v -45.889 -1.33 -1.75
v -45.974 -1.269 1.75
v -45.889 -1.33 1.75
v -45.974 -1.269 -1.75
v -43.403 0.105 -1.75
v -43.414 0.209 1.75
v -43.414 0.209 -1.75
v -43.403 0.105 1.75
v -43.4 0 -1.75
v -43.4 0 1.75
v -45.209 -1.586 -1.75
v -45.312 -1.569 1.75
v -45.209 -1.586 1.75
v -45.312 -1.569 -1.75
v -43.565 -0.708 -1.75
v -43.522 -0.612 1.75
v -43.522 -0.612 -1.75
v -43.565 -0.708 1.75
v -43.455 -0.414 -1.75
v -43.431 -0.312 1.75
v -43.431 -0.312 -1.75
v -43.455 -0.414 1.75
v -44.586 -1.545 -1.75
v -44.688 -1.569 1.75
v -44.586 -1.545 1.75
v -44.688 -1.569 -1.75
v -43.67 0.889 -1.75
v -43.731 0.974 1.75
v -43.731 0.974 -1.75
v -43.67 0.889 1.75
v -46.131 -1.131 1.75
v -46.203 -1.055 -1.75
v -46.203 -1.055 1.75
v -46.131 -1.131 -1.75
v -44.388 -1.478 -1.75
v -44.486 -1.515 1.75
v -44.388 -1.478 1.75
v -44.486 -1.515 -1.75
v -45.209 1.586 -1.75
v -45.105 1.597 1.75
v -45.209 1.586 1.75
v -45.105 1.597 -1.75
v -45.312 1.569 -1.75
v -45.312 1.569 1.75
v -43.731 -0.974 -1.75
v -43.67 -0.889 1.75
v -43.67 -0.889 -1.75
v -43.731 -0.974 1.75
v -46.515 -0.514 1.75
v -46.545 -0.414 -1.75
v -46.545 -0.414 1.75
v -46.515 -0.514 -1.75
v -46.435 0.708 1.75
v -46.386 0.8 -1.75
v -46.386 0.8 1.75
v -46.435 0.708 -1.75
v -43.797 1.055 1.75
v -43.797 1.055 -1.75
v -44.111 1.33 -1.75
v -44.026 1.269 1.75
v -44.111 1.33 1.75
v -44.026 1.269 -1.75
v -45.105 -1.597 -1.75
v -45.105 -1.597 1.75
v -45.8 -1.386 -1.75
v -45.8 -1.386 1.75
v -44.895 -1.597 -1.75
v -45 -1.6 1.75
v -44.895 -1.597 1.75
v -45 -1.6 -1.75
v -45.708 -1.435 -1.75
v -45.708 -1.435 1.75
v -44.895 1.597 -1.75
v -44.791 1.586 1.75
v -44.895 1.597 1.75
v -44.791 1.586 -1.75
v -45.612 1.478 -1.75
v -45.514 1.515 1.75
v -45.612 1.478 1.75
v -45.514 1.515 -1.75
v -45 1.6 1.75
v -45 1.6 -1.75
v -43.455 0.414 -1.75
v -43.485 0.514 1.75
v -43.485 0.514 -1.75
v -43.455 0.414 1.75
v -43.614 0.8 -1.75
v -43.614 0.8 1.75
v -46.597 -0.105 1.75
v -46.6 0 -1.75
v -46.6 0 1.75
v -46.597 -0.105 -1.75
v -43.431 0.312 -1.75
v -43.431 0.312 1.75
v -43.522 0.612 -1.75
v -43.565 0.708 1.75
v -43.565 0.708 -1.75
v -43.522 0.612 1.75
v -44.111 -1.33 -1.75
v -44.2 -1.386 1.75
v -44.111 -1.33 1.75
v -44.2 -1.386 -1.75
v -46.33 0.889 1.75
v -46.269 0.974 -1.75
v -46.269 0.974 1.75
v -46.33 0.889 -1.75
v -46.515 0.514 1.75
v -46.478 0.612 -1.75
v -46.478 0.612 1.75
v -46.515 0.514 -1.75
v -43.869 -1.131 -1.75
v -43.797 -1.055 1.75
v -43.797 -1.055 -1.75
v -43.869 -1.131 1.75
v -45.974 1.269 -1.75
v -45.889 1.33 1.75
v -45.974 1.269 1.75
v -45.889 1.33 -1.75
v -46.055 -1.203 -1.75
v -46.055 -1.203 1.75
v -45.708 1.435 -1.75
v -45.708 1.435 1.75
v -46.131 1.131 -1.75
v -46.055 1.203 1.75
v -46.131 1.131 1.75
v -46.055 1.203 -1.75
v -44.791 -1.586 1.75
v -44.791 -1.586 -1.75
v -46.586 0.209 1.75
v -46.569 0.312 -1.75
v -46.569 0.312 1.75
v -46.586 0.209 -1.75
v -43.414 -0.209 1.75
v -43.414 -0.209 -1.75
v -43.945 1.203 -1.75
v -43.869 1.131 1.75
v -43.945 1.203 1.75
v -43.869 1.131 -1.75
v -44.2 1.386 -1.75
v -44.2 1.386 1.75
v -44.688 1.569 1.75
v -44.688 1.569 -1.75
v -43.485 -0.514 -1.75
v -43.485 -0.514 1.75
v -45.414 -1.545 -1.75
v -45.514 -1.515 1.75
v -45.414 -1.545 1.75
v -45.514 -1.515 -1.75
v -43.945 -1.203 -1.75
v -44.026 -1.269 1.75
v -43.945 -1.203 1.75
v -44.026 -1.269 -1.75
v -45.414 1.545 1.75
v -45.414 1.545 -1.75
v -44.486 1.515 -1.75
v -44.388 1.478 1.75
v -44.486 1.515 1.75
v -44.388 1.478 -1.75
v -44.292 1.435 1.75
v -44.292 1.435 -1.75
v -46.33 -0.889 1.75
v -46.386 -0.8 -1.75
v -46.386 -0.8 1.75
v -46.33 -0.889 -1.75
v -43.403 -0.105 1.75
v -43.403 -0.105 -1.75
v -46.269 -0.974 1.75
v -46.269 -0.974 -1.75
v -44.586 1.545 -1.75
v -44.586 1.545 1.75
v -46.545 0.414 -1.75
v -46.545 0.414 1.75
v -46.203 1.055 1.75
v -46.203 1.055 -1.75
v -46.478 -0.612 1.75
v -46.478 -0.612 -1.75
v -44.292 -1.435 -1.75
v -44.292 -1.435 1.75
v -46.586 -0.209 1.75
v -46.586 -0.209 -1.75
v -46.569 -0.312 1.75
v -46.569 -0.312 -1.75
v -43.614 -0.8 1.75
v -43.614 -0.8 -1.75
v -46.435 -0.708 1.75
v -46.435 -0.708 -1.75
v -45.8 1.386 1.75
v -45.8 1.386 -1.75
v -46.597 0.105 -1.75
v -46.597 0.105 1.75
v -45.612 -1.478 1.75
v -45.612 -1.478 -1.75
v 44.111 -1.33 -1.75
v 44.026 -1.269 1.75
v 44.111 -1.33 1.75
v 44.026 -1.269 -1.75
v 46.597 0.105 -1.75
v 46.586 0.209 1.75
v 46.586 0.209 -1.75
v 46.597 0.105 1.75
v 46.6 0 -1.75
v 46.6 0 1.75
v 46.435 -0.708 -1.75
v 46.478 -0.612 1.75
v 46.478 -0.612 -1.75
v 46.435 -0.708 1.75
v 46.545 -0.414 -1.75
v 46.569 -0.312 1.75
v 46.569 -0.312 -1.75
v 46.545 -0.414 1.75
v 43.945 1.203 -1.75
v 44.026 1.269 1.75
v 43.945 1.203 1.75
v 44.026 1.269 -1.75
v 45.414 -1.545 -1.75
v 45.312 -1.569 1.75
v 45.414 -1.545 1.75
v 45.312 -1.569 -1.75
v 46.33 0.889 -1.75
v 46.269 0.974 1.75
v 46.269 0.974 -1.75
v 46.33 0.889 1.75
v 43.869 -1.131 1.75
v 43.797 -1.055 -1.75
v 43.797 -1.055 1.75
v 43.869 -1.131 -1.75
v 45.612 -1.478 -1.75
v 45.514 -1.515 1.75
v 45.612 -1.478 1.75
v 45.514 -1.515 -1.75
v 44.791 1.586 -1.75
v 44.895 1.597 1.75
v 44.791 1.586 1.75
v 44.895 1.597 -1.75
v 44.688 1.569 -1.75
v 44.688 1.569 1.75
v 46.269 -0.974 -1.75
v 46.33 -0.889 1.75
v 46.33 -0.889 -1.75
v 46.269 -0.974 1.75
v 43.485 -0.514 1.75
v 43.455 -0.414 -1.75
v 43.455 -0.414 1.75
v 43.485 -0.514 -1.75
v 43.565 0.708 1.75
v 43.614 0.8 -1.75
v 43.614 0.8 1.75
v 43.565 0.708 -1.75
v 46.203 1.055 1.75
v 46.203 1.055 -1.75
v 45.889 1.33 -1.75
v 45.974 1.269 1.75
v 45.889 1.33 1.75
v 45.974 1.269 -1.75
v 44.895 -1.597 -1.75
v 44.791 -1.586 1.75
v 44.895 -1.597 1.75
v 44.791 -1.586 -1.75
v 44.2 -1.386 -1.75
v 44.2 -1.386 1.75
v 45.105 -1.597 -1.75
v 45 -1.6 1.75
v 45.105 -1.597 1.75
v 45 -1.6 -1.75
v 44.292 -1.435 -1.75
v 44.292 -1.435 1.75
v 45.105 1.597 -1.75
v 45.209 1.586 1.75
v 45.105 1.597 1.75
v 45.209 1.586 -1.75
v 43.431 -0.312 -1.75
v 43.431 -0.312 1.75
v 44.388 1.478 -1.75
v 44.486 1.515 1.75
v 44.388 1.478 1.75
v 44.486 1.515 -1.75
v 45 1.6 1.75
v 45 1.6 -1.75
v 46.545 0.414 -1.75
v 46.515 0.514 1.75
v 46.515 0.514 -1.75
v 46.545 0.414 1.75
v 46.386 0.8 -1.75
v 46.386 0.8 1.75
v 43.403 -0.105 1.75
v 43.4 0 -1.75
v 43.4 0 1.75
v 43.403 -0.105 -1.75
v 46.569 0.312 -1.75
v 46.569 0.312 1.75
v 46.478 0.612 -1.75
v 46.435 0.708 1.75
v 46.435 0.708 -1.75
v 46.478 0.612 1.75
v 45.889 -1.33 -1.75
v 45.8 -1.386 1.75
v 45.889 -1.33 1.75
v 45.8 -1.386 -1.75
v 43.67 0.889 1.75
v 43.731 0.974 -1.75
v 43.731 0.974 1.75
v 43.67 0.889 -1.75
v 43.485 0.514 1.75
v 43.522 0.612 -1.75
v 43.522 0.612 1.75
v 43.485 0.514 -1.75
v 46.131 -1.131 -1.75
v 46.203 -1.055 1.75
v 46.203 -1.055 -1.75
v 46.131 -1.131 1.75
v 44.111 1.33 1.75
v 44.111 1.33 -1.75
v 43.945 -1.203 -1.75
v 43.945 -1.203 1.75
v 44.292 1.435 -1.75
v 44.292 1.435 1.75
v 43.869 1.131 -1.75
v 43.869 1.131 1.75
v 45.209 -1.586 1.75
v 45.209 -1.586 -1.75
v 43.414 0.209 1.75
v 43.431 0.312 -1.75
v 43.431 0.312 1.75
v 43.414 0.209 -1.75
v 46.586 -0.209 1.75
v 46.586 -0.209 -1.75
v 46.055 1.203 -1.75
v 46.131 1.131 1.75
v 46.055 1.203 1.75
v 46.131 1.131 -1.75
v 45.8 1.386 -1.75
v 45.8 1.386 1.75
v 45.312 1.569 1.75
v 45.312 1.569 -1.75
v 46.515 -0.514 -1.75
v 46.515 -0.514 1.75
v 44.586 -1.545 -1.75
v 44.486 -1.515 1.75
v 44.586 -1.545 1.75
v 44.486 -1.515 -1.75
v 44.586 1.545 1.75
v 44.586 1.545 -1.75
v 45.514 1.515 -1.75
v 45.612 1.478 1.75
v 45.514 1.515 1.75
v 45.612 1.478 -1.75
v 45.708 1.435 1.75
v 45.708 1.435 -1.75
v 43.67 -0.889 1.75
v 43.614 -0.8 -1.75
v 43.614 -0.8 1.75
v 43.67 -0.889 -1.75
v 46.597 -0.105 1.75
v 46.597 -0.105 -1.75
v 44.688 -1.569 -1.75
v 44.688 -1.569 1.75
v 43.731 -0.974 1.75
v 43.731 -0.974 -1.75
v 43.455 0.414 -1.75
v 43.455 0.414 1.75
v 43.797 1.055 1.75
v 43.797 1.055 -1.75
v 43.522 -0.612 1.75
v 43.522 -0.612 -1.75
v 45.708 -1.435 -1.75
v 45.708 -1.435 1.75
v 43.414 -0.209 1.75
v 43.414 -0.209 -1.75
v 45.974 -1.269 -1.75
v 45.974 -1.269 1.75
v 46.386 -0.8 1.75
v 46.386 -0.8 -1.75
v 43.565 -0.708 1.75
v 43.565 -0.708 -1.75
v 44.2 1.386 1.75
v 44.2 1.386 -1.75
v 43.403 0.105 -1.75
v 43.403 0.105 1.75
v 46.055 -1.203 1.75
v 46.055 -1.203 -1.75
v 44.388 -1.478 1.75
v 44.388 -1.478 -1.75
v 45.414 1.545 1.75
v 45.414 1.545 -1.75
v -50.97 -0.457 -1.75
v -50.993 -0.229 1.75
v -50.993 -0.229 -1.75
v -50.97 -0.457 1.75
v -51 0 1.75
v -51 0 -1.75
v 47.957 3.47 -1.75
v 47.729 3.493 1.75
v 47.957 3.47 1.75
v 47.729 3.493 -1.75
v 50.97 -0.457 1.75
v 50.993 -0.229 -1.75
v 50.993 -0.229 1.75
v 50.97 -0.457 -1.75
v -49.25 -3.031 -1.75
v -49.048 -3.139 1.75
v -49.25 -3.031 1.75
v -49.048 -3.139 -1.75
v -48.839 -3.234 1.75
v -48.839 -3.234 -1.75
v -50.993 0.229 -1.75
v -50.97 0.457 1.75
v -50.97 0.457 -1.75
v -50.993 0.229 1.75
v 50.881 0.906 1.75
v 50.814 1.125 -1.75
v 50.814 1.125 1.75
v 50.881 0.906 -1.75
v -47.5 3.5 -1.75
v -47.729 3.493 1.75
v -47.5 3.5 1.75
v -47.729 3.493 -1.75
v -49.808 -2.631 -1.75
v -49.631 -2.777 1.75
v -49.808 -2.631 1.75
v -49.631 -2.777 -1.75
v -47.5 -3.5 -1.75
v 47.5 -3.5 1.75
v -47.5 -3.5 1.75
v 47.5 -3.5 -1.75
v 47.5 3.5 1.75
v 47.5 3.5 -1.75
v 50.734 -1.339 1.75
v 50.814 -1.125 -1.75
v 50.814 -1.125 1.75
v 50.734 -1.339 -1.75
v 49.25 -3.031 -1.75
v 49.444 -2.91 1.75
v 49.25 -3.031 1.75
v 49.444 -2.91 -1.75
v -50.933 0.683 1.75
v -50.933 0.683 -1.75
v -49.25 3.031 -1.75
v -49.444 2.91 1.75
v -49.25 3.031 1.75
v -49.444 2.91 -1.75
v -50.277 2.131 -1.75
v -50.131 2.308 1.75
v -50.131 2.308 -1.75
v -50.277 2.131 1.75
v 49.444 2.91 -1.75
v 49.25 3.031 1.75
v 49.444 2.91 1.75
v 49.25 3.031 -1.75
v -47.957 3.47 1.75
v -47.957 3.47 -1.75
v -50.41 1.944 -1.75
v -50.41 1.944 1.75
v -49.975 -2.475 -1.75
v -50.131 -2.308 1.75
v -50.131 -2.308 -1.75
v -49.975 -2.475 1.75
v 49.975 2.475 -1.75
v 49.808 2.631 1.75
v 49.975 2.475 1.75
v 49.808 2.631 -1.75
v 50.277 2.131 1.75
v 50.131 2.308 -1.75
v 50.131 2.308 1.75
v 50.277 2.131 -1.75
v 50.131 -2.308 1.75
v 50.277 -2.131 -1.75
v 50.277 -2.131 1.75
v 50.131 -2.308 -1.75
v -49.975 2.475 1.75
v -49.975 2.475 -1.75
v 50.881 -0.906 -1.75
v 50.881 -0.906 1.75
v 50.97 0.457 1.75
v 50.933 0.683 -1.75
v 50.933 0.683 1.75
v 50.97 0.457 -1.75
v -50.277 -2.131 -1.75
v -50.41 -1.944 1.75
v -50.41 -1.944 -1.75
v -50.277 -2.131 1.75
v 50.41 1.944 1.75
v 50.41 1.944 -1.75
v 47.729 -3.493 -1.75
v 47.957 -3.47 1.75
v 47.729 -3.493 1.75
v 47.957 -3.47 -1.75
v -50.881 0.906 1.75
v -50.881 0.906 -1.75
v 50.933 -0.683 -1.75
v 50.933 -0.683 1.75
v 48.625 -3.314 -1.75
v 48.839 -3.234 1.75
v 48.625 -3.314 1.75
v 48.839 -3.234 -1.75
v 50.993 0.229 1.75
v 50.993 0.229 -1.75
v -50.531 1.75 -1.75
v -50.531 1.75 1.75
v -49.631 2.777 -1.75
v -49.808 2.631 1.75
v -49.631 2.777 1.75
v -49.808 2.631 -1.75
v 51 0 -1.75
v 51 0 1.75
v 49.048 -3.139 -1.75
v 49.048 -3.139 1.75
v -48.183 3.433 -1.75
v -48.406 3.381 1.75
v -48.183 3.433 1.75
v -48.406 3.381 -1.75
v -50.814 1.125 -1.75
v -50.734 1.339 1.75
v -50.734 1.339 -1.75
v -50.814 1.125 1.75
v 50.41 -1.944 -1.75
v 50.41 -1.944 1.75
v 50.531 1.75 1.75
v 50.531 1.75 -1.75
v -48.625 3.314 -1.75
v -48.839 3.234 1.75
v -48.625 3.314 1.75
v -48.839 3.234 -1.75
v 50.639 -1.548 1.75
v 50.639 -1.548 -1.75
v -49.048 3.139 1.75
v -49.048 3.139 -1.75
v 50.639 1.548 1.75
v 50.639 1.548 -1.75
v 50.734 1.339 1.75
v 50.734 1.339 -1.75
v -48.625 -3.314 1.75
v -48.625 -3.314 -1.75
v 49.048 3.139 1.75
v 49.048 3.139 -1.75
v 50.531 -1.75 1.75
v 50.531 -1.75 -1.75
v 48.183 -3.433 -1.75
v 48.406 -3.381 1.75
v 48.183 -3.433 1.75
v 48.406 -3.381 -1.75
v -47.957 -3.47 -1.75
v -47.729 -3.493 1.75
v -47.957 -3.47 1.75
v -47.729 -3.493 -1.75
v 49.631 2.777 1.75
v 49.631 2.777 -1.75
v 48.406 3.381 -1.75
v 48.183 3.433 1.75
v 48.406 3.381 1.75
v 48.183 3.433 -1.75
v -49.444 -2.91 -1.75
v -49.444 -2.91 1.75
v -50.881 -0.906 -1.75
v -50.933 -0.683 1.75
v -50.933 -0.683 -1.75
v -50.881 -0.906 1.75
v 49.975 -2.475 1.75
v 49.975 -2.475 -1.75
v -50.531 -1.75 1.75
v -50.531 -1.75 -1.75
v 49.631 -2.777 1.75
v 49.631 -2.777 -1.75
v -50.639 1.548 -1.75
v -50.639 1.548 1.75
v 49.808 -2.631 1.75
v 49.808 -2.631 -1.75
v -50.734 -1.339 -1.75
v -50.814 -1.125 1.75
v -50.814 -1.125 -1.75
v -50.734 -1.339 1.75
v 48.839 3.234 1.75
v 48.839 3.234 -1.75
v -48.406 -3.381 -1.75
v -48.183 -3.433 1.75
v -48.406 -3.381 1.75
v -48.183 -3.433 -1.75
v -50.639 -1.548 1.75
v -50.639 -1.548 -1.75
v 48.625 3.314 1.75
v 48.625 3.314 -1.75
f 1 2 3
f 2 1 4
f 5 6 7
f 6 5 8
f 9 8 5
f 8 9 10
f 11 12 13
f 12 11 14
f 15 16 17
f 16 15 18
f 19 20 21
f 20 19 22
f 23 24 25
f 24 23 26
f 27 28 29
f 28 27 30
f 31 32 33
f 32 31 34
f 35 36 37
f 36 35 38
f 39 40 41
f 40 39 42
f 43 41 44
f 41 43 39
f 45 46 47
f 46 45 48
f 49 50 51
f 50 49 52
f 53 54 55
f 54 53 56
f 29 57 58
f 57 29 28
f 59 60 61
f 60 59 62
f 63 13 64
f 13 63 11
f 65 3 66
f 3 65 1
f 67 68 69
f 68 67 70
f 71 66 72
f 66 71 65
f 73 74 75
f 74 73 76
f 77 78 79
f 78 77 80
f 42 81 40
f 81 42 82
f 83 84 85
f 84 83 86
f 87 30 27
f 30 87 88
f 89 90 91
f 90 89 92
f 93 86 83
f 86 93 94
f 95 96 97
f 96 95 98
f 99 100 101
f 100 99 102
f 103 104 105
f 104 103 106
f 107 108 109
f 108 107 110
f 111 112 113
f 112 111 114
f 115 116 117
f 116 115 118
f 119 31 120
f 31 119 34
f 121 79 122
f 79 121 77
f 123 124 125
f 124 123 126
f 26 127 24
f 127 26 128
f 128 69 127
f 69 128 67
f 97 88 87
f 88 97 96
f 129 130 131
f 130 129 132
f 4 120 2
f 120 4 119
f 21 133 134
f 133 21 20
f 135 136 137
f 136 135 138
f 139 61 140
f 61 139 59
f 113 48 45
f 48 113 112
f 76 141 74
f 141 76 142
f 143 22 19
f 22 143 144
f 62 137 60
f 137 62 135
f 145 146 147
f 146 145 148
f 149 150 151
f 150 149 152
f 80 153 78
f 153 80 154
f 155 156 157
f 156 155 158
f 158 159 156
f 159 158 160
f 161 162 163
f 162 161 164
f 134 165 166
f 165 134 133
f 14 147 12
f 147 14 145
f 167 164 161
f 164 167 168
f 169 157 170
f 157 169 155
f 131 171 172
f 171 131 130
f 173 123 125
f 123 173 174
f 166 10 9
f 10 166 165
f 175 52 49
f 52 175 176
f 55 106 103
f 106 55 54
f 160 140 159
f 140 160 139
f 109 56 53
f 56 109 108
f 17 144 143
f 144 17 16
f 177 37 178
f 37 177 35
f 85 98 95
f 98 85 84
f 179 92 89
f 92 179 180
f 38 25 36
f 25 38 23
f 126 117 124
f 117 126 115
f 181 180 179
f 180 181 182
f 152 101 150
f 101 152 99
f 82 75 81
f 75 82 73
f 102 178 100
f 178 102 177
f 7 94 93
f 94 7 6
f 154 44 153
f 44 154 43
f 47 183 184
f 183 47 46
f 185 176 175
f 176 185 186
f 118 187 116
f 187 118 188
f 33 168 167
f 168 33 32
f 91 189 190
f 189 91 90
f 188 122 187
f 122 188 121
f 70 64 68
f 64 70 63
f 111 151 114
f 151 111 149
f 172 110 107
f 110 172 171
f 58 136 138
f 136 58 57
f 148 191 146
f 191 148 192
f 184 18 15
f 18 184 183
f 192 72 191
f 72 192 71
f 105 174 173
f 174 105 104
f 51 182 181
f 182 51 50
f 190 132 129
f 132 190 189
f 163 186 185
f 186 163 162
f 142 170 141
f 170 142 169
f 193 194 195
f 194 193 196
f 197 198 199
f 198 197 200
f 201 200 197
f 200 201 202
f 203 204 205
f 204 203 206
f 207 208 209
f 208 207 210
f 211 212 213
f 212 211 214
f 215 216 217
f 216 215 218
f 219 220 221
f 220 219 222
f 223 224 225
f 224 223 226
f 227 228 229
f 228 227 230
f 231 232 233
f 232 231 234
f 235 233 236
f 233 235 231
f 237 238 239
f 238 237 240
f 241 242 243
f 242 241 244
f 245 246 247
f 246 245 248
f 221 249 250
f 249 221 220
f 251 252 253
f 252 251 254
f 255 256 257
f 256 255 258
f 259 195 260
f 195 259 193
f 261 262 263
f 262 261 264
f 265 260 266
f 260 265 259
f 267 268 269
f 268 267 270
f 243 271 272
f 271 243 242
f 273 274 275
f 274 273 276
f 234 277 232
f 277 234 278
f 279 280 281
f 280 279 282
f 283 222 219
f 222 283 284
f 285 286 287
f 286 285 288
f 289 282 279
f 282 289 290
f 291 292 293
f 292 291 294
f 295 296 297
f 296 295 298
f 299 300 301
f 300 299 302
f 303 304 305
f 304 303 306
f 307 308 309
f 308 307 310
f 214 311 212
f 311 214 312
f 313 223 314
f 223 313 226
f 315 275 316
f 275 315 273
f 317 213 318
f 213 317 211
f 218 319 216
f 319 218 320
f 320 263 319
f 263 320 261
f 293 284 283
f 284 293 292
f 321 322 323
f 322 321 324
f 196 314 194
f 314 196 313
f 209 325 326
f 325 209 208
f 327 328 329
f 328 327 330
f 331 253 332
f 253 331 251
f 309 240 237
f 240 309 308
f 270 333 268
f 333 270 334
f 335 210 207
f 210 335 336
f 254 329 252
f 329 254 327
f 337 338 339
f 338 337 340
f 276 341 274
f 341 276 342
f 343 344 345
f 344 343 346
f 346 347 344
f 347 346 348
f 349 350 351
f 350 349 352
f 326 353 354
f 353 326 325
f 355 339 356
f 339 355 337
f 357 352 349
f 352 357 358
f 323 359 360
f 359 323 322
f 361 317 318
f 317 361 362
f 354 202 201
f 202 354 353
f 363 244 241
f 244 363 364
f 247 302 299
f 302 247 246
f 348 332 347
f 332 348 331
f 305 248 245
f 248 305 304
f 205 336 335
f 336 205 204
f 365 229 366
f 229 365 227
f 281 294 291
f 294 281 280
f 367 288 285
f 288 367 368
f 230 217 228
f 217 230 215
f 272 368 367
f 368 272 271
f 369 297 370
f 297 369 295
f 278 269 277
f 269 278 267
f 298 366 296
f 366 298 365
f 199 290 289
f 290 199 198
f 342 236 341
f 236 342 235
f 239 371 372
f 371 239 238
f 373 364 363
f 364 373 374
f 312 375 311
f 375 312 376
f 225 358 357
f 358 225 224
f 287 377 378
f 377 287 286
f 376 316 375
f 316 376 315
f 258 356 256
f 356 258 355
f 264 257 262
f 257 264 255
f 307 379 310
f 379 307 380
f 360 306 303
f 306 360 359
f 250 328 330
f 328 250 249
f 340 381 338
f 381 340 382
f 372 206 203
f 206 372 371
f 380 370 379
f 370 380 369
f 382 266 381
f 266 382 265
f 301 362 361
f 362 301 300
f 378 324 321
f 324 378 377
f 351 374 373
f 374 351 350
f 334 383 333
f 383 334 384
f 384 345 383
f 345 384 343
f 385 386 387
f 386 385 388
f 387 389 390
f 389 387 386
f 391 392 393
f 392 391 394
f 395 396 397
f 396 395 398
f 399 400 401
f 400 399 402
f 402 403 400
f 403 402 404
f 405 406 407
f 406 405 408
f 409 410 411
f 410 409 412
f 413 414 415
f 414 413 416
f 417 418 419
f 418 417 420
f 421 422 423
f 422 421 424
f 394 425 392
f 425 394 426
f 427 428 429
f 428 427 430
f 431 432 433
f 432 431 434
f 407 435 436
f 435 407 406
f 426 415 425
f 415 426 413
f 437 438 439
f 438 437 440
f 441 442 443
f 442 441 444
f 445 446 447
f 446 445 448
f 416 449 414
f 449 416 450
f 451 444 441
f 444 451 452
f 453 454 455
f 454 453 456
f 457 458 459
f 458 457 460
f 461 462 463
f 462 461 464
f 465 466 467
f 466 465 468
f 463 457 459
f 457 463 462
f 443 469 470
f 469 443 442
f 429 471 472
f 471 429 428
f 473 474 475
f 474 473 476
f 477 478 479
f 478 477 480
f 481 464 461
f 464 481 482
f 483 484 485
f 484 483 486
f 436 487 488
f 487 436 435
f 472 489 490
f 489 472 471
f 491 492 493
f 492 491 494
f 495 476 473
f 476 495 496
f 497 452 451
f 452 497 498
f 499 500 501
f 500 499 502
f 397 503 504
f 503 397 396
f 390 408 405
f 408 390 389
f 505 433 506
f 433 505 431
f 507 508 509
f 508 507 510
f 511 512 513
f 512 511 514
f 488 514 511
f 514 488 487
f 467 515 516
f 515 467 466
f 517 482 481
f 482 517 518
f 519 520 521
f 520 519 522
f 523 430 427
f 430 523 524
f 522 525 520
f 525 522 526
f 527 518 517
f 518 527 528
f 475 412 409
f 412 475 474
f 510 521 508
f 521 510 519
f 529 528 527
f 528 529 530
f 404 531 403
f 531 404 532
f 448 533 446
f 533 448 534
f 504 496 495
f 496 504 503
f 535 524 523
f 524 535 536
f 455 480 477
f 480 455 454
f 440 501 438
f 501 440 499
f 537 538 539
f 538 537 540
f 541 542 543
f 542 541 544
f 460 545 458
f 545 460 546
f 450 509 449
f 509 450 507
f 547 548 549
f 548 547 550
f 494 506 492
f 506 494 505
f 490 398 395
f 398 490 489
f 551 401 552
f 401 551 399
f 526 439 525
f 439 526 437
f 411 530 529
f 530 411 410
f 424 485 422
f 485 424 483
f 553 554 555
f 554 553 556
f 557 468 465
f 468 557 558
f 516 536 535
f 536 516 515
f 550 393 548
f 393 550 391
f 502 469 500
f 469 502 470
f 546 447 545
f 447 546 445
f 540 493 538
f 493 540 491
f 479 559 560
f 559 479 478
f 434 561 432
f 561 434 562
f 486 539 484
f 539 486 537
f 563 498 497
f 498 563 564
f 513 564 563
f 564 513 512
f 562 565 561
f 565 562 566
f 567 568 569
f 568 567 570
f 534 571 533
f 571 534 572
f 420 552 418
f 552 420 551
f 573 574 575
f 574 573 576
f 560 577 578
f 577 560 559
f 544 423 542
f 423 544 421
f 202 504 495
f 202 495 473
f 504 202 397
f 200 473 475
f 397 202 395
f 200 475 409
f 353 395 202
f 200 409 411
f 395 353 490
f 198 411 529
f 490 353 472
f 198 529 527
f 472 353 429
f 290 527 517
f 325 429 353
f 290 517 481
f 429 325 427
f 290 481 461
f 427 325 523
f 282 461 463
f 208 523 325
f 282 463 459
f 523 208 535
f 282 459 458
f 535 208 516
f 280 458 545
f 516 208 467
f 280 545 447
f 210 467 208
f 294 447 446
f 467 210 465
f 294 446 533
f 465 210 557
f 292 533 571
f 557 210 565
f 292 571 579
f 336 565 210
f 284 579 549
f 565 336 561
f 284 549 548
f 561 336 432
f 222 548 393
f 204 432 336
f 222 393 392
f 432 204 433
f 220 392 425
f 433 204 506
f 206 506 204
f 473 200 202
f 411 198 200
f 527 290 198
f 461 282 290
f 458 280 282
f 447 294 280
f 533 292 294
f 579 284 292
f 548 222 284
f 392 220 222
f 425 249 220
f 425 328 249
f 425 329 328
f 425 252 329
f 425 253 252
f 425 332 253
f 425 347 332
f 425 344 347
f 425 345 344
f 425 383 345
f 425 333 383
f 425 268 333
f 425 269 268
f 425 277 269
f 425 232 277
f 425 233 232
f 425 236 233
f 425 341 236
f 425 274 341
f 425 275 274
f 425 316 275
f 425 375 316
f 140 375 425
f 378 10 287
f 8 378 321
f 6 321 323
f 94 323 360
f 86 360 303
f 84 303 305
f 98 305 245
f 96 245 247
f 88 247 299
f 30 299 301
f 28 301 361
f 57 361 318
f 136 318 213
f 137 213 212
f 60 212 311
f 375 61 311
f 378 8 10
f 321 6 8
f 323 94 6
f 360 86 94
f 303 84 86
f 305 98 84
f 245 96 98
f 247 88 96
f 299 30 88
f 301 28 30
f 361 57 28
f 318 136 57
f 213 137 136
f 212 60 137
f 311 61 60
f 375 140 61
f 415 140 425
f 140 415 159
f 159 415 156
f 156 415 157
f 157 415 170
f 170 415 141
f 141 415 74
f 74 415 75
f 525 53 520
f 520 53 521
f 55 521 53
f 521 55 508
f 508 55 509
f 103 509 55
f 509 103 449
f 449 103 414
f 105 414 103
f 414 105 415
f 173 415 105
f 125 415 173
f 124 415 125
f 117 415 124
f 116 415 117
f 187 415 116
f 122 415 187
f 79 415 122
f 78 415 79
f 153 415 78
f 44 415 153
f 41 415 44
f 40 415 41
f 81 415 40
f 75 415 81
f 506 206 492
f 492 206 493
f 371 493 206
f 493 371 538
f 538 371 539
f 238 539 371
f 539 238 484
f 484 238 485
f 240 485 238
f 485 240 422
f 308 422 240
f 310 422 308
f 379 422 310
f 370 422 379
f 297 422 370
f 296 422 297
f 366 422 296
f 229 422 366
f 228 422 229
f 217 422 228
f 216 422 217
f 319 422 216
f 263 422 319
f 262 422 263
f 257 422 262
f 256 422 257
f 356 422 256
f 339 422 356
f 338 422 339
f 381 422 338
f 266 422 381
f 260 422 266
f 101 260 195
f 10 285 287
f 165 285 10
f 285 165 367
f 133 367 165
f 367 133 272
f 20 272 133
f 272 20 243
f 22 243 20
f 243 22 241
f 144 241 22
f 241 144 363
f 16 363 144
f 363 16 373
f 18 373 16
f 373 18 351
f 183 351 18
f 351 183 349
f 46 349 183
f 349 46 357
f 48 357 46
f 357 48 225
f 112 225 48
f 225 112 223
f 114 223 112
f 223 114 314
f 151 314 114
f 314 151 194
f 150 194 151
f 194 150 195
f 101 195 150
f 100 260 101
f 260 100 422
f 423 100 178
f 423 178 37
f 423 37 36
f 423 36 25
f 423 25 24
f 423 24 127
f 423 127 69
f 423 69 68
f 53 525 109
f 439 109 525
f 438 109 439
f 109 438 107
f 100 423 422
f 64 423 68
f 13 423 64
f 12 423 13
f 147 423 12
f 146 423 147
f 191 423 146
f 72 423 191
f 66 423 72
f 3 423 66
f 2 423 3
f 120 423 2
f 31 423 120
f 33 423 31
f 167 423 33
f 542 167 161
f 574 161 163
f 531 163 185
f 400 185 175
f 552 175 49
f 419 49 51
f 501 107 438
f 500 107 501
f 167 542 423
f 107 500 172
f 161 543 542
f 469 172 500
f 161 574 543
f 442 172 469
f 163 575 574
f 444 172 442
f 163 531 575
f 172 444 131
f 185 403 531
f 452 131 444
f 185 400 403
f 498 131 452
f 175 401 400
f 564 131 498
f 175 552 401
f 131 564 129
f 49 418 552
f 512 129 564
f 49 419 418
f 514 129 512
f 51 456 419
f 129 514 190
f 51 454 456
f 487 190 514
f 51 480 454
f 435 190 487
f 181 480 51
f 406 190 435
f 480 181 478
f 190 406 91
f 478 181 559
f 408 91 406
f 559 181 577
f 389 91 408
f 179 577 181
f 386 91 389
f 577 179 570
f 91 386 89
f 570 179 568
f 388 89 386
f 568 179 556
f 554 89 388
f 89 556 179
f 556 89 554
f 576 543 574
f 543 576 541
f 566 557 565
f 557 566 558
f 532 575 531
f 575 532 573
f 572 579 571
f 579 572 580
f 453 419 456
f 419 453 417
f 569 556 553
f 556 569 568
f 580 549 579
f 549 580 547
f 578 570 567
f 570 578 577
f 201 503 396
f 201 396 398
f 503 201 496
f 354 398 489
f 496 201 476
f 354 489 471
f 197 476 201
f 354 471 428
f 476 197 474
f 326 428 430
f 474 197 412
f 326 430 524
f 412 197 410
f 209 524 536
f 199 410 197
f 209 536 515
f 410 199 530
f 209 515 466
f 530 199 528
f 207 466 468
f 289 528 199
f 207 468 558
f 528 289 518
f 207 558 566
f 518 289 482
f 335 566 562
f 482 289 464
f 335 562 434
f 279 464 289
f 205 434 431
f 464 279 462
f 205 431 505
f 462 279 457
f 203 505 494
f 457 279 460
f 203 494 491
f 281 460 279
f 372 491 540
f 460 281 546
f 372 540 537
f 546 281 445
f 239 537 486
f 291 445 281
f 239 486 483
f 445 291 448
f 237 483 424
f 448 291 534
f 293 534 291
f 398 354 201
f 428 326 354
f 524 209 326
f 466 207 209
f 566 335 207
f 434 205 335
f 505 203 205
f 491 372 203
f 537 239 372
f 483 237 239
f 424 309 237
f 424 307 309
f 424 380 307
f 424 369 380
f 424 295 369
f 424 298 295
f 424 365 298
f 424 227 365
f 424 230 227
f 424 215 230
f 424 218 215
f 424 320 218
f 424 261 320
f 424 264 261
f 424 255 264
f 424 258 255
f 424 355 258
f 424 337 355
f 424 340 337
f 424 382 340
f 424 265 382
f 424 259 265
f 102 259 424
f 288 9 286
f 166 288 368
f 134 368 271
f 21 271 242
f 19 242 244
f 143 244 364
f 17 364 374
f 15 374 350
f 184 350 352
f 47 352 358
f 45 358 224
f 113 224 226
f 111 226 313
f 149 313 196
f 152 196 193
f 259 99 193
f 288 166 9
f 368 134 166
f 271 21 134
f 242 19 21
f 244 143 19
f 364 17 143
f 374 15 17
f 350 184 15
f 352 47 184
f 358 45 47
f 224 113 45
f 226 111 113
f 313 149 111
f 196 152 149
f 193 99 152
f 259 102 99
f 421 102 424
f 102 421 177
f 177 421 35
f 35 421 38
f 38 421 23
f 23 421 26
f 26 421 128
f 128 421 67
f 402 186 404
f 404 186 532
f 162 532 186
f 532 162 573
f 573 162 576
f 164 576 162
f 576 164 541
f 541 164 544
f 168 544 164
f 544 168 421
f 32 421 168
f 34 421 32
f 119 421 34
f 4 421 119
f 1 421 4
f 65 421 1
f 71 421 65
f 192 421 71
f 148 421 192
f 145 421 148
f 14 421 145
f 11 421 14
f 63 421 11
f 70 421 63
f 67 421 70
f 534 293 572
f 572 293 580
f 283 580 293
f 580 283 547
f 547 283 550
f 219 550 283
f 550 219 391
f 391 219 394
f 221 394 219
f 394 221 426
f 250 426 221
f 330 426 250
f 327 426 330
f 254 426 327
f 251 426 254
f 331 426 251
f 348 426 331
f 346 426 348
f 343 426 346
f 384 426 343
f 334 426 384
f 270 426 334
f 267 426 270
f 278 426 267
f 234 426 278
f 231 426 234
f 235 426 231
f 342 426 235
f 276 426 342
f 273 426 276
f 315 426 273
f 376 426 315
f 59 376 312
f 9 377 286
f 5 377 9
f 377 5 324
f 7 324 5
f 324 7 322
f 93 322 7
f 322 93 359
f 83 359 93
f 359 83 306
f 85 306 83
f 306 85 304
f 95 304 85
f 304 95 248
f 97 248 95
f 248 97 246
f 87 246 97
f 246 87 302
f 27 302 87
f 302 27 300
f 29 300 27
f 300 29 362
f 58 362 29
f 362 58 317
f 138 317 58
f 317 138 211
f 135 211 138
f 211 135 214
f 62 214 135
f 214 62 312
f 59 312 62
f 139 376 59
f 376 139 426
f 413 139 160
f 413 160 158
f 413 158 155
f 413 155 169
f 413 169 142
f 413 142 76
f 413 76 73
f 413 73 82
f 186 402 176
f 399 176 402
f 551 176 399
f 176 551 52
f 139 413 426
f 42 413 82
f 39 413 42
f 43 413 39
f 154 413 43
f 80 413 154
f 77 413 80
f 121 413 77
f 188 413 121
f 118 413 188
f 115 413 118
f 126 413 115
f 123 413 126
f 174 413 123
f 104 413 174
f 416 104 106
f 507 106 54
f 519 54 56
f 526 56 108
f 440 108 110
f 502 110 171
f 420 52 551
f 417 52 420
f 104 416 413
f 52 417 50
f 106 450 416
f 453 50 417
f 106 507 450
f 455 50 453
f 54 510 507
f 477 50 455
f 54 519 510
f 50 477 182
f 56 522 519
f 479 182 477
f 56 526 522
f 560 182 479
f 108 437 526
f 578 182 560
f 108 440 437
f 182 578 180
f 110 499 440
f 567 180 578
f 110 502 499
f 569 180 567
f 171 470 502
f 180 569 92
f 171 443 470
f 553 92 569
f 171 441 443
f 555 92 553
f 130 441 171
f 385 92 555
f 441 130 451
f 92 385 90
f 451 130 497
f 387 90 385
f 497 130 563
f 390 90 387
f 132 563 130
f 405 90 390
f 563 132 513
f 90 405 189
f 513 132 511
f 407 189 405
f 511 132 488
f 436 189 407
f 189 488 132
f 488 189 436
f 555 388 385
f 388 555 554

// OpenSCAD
$fn=96;

L = 102.0;
W = 7.0;
T = 3.5;

hole_d = 3.2;
end_margin = 6.0;
hole_offset = L/2 - end_margin;

module rounded_bar_2d(len, wid){
    r = wid/2;
    hull(){
        translate([-len/2 + r, 0]) circle(r=r);
        translate([ len/2 - r, 0]) circle(r=r);
    }
}

module strap(){
    difference(){
        linear_extrude(height=T, center=true)
            rounded_bar_2d(L, W);

        for (sx = [-1, 1]){
            translate([sx*hole_offset, 0, 0])
                cylinder(d=hole_d, h=T+1.0, center=true);
        }
    }
}

strap();
